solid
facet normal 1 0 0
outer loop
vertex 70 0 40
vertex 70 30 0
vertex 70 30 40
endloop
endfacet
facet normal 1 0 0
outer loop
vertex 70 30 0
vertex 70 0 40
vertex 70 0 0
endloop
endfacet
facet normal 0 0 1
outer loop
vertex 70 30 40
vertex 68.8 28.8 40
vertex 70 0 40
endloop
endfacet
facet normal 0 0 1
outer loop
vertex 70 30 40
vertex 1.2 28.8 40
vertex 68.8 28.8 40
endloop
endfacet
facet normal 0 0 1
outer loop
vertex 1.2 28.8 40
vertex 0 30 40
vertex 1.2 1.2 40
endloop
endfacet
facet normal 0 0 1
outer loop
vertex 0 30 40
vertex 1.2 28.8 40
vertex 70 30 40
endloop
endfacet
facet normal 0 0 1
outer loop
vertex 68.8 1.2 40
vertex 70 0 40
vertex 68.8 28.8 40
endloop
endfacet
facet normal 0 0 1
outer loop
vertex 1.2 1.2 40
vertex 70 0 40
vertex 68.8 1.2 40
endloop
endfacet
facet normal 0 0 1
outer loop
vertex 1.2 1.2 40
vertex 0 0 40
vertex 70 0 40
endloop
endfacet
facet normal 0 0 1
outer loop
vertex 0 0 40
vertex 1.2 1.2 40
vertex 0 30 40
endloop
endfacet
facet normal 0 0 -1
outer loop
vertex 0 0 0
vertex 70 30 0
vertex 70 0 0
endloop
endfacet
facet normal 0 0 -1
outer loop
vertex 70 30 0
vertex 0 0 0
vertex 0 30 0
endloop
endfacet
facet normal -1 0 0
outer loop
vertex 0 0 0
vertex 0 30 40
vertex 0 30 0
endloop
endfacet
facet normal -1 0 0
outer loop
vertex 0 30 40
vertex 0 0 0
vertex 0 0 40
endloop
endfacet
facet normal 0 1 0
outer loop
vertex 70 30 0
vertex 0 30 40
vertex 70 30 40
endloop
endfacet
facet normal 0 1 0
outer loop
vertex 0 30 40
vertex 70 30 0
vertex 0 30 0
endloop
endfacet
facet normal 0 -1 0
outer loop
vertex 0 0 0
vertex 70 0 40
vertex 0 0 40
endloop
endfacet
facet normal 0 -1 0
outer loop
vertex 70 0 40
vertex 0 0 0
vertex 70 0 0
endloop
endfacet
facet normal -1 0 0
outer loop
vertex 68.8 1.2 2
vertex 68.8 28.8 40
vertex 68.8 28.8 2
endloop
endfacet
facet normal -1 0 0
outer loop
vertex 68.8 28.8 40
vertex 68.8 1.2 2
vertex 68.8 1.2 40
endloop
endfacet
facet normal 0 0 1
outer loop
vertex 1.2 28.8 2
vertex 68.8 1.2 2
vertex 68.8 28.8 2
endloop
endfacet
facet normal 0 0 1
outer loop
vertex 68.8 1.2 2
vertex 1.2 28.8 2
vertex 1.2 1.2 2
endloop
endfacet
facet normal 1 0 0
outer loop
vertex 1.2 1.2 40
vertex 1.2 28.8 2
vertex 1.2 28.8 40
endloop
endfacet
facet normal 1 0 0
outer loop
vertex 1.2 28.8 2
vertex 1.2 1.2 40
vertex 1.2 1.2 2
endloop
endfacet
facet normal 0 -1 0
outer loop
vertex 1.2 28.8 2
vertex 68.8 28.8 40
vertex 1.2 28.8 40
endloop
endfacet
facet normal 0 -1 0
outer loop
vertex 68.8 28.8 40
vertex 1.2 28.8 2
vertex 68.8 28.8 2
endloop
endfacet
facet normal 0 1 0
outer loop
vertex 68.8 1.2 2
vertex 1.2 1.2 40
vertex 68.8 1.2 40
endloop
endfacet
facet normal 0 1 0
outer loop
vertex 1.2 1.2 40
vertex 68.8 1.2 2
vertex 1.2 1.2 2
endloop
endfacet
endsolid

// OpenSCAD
$fn = 32;

// ----------------------------------------------------------------------
// Open box: 1.2 mm walls
// ----------------------------------------------------------------------

// --- parameters (mm) ---
box_l = 70;               // outer length, X
box_w = 30;               // outer width, Y
box_h = 40;               // outer height, Z
wall = 1.2;               // wall thickness
floor = 2;                // floor thickness

difference() {
  cube([box_l, box_w, box_h]);
  translate([wall, wall, floor])
    cube([box_l - 2 * wall, box_w - 2 * wall, box_h]);
}
